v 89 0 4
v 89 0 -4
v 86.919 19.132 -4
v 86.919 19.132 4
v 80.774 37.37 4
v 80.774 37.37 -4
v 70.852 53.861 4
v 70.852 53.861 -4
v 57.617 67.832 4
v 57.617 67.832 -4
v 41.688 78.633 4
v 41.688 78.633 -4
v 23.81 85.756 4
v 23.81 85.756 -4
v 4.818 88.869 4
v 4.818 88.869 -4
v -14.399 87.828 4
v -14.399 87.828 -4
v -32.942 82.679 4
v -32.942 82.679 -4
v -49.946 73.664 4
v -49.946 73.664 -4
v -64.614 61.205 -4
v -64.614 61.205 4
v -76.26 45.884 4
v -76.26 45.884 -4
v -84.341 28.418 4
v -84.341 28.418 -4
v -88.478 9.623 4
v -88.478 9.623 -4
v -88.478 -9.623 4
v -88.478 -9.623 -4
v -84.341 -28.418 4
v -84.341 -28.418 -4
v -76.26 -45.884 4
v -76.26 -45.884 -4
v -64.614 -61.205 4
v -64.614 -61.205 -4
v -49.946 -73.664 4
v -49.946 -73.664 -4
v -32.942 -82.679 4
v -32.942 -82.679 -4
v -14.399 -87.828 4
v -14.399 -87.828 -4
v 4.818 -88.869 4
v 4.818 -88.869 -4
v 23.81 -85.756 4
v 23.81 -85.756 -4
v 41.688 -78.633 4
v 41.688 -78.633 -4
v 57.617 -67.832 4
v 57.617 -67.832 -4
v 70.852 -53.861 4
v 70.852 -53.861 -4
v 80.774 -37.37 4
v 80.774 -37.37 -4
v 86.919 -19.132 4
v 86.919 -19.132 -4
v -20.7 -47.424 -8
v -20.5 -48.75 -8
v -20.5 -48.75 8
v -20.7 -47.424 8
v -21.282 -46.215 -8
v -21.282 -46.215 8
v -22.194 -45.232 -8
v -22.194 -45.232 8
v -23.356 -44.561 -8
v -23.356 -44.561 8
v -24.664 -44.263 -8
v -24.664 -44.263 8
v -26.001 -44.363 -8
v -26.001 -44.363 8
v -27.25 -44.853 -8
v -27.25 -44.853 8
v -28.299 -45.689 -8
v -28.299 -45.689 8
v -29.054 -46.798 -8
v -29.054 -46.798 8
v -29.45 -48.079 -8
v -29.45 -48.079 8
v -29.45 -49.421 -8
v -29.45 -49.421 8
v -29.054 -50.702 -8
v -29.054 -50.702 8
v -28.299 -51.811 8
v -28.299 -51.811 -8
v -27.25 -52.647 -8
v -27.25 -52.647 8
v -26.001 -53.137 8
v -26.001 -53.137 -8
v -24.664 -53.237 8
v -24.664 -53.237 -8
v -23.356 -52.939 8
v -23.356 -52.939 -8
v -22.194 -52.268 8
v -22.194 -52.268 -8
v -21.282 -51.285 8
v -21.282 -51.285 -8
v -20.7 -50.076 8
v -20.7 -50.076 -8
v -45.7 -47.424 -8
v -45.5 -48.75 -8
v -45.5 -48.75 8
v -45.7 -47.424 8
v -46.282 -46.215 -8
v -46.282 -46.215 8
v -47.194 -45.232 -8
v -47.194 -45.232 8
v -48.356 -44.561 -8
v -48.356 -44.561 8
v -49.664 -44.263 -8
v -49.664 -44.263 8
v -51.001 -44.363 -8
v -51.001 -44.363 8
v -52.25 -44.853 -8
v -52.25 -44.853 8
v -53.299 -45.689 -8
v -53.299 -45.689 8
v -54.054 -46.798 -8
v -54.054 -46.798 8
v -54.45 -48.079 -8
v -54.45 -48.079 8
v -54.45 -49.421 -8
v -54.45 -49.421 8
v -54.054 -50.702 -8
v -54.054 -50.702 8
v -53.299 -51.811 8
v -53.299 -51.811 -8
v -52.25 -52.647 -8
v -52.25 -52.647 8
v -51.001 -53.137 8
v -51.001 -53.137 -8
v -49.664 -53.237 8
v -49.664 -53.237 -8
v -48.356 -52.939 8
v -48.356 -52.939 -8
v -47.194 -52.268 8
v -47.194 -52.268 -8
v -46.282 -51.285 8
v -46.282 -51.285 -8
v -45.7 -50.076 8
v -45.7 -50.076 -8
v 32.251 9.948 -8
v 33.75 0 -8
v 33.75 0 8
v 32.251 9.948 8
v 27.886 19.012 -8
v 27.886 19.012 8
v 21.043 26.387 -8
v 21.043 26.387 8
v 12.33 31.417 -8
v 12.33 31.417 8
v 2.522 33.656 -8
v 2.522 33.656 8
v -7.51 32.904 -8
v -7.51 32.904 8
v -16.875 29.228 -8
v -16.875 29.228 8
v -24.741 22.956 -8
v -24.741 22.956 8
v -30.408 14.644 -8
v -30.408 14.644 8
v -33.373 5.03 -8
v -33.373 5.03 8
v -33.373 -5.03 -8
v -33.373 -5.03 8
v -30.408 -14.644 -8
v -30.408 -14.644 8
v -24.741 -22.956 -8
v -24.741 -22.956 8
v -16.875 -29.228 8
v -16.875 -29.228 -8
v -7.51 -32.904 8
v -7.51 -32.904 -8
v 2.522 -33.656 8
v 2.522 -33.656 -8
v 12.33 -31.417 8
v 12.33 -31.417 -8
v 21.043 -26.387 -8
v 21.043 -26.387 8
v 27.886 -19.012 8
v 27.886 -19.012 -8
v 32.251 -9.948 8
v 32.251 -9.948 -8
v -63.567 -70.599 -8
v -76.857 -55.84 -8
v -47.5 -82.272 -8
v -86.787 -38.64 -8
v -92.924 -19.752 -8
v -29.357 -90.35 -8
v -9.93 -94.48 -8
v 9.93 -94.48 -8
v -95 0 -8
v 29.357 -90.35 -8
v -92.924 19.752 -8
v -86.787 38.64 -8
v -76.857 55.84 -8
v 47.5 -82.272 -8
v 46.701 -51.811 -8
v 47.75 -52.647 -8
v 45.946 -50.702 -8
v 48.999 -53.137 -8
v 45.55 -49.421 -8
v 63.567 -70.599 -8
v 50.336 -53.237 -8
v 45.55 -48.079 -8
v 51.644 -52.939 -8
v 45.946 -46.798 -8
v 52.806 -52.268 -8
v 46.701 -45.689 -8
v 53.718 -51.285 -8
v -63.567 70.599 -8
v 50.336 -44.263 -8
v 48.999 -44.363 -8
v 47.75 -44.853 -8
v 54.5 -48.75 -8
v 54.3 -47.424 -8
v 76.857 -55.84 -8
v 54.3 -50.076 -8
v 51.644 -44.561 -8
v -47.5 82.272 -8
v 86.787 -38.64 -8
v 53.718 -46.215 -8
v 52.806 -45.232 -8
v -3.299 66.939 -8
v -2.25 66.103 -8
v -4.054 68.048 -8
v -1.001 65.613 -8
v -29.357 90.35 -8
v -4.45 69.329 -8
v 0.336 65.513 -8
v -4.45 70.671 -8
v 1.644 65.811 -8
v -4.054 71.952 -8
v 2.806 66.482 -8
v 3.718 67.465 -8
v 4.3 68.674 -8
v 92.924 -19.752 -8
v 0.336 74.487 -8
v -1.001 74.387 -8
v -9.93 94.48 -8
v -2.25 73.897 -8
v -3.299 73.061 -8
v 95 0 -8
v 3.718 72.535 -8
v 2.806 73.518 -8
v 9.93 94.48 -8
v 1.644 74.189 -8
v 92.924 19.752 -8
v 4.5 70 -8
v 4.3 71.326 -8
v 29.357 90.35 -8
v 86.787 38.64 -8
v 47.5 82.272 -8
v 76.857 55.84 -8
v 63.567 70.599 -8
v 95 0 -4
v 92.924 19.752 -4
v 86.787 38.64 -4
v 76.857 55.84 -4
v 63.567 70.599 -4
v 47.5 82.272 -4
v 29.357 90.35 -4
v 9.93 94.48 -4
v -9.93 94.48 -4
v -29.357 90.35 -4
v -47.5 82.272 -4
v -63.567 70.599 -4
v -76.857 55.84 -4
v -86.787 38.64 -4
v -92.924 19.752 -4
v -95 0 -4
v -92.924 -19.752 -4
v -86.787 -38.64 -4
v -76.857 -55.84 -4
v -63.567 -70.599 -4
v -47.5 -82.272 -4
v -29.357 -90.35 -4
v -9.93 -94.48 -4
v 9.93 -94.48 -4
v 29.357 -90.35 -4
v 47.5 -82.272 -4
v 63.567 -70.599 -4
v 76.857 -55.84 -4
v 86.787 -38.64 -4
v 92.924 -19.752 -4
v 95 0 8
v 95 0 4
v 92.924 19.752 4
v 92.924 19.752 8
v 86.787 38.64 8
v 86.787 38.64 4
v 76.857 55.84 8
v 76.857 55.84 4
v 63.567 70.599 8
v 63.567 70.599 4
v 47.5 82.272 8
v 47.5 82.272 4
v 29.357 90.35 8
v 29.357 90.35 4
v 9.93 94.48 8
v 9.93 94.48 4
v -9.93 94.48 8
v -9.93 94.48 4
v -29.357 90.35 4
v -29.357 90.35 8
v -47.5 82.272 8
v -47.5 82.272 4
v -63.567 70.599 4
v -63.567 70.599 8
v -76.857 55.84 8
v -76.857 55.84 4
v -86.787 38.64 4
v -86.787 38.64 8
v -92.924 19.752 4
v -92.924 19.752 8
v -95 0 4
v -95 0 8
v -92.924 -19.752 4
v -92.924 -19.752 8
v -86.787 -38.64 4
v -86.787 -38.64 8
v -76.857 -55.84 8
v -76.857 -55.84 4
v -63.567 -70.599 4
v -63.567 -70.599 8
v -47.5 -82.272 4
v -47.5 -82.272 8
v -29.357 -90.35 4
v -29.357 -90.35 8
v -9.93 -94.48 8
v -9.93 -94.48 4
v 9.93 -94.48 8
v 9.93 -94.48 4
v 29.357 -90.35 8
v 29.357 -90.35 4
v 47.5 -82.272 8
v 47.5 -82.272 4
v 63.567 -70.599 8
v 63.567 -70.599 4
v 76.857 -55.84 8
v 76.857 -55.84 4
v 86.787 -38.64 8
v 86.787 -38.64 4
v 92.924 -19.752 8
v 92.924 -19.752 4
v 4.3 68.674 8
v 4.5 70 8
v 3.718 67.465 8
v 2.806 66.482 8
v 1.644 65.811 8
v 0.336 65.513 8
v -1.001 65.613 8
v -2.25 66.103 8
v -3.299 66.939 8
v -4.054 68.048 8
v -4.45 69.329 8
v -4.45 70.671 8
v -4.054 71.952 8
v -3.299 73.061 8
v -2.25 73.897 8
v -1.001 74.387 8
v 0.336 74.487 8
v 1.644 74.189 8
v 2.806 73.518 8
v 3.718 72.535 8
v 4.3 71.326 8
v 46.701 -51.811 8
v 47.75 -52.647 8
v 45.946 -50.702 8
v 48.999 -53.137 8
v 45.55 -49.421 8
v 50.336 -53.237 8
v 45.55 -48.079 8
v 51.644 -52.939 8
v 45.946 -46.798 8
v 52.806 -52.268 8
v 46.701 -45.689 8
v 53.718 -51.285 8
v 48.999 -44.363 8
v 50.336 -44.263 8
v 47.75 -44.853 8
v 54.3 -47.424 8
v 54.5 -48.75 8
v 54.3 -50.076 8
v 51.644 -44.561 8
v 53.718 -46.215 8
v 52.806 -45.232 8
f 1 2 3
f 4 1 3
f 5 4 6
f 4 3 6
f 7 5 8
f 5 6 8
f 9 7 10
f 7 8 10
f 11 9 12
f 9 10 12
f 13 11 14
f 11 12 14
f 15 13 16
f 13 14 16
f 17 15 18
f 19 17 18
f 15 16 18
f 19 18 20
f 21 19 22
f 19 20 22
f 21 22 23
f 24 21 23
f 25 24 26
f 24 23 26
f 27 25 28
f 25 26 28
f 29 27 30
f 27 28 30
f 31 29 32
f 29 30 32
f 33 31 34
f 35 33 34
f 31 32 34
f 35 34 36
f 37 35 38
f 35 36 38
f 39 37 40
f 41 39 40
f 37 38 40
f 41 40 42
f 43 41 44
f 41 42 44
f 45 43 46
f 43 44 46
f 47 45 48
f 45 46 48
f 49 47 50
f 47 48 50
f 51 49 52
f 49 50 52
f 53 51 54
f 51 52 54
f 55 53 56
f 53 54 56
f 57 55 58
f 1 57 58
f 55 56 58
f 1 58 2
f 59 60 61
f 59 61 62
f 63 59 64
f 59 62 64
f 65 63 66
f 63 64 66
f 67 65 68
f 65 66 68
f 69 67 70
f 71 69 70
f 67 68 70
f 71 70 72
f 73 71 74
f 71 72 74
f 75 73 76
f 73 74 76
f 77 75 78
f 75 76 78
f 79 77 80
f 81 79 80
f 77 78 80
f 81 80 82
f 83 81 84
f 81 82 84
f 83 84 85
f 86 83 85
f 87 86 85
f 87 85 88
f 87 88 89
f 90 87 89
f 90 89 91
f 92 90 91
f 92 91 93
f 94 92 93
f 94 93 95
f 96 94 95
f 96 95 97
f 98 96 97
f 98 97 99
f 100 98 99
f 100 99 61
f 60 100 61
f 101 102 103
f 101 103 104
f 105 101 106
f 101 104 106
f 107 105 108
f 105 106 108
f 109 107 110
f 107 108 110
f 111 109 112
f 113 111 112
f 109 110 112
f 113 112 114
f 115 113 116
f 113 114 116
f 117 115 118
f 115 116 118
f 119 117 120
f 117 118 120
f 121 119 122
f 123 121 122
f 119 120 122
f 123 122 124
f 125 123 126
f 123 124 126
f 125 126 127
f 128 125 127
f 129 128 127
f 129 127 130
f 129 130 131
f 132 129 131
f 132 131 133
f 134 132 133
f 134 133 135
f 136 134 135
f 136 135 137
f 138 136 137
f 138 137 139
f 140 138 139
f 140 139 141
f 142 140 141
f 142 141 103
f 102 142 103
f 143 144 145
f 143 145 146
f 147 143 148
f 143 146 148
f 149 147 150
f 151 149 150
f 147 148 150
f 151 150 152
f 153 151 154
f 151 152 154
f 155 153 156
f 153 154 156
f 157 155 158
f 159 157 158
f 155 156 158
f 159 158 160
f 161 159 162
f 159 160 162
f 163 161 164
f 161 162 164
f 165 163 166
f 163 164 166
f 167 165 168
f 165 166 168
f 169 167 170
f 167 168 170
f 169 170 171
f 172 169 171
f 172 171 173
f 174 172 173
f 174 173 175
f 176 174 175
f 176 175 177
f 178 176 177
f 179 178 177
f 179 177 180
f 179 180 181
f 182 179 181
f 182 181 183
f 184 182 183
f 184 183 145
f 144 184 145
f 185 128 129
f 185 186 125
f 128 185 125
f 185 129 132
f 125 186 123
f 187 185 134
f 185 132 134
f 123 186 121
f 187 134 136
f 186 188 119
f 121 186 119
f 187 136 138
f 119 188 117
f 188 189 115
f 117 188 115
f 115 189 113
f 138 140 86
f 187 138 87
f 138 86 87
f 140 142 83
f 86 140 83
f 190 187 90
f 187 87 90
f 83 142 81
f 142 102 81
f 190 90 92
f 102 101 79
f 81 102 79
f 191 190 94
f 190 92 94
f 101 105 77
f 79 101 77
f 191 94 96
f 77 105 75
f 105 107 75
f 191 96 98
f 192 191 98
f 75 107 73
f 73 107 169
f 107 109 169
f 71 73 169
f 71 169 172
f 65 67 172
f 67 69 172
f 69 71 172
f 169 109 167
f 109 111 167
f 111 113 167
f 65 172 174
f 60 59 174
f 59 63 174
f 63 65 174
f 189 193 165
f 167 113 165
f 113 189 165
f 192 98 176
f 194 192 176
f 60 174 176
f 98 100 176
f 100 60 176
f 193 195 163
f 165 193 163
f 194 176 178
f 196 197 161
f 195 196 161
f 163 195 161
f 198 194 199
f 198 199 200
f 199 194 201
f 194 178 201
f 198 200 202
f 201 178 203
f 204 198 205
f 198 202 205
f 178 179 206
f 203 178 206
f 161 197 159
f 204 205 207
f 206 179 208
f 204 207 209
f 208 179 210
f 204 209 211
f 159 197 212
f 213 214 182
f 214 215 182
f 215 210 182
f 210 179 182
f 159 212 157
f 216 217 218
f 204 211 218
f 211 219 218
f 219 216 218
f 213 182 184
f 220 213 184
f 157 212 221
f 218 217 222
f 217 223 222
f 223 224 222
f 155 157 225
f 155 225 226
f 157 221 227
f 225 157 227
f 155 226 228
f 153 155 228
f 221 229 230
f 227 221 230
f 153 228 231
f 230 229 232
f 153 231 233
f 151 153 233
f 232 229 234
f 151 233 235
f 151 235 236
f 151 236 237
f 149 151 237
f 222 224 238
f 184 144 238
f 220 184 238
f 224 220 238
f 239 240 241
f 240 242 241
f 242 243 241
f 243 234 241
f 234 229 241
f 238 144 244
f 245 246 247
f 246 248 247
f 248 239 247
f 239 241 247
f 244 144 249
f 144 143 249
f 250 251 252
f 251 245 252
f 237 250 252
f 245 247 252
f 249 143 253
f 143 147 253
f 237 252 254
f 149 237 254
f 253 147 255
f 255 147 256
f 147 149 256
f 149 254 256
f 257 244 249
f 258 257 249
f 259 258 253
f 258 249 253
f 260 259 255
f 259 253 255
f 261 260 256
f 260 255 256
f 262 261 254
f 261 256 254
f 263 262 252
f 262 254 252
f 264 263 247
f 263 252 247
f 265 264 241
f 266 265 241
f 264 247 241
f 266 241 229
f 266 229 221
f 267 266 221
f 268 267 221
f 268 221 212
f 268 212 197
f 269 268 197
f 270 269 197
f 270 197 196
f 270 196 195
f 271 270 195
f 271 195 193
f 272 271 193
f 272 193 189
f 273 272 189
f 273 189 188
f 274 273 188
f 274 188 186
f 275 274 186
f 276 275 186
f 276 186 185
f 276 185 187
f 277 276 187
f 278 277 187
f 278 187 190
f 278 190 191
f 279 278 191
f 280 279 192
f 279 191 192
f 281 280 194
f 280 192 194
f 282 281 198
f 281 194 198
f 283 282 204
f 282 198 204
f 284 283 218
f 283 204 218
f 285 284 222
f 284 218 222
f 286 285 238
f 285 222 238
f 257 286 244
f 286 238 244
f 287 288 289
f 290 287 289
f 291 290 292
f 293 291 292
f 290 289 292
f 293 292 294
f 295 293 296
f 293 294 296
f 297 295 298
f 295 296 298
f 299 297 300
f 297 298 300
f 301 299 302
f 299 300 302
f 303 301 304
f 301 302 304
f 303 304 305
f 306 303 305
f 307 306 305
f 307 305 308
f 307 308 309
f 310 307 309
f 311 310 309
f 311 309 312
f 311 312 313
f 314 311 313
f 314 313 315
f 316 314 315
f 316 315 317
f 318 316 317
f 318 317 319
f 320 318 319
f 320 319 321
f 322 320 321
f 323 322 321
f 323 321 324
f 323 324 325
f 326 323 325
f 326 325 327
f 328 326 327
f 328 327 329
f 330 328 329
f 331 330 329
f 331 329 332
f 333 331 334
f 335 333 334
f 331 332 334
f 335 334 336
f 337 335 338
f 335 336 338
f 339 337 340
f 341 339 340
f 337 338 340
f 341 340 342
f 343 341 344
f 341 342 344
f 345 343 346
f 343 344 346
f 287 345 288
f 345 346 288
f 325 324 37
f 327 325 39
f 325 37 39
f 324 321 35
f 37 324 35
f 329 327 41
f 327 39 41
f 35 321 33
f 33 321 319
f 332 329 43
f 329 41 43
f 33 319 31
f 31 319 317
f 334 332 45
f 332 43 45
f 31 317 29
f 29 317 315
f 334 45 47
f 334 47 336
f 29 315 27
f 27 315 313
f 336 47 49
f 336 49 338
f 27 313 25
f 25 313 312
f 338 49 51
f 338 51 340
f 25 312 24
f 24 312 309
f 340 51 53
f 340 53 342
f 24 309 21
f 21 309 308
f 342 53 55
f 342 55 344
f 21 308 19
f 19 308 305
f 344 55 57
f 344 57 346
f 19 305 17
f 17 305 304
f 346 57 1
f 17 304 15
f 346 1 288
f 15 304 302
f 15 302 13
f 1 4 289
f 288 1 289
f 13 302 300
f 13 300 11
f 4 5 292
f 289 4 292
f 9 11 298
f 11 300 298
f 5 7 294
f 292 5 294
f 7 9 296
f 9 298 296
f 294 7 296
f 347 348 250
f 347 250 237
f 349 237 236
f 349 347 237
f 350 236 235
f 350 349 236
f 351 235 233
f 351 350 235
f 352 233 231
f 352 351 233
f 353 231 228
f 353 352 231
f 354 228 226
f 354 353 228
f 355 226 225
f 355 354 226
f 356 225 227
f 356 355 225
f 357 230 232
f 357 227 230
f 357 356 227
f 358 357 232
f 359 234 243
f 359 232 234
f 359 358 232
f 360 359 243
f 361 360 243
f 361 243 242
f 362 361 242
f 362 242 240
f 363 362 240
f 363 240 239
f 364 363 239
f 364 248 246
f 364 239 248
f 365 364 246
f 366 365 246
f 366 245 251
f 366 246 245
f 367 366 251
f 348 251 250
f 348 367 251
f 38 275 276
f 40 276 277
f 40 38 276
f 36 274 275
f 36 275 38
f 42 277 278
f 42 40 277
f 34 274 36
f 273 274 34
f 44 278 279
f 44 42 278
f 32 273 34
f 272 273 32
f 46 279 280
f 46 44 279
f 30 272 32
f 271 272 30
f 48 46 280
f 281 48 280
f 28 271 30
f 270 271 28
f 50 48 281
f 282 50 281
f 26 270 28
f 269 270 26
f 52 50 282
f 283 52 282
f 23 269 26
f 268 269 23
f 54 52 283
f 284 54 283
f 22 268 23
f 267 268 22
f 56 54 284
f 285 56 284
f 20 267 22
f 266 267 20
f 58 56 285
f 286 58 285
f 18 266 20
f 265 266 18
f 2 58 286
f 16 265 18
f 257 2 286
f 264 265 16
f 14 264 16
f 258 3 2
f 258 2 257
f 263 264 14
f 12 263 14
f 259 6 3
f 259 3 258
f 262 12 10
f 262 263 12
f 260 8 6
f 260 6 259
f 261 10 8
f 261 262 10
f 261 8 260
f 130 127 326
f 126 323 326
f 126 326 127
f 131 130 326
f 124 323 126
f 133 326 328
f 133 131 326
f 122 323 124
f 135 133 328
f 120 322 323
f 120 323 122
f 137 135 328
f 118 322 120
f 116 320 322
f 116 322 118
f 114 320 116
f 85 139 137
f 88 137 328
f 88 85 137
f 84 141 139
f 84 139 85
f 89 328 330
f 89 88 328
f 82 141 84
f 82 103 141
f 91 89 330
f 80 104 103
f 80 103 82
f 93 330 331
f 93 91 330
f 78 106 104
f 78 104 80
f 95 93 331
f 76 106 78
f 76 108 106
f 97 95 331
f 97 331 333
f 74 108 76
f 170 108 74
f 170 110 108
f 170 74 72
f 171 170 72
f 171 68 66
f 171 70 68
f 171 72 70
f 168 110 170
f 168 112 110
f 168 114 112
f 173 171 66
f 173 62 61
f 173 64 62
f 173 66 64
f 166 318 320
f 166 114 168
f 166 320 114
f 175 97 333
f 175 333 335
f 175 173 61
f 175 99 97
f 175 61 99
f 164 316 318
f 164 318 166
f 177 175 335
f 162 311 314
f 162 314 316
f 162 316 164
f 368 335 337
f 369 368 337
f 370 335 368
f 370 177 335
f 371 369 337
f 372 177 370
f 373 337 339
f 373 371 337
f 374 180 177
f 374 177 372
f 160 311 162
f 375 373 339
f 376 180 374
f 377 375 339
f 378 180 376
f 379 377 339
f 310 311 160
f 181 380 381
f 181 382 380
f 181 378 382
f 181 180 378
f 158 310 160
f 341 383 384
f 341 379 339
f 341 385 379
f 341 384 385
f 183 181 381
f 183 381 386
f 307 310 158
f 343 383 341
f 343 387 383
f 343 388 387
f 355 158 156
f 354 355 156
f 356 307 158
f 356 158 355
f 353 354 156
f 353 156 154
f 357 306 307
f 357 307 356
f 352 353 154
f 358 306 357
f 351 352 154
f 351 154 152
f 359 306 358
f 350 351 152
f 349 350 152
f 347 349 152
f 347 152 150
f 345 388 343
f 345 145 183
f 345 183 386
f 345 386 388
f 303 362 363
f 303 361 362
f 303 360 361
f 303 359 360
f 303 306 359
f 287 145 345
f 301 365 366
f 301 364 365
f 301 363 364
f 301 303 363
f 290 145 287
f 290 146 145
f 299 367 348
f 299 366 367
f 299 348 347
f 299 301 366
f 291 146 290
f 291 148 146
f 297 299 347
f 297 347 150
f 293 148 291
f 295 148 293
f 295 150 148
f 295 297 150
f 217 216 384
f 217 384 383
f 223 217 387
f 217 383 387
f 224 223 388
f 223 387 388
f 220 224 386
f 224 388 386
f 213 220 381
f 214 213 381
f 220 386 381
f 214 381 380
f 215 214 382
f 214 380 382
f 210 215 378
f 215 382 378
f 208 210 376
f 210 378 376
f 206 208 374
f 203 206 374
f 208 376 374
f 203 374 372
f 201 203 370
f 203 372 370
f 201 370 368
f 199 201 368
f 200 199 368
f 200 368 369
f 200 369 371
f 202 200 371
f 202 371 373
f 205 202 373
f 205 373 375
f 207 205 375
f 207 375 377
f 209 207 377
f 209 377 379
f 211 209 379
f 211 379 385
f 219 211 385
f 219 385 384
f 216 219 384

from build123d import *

# Parameters (mm, degrees)
BOSS_EXTRUDE1_DEPTH      = 8
BOSS_EXTRUDE1_DEPTH_BACK = 8
SKETCH2_R                = 95
CUT_EXTRUDE1_DEPTH       = 4
CUT_EXTRUDE1_DEPTH_BACK  = 4
SKETCH2_5_R              = 95
SKETCH2_5_R_2            = 89
SKETCH7_R                = 4.5
CUT_EXTRUDE2_DEPTH       = 167
SKETCH3_R                = 33.75
CUT_EXTRUDE3_DEPTH       = 43
CUT_EXTRUDE4_DEPTH       = 112
CUT_EXTRUDE4_DEPTH_BACK  = 60
SKETCH10_R               = 4.5


with BuildPart() as part:
    # Sketch2 → Boss-Extrude1 (new, two sides: drawn at the far end of the back side and taken through both)
    with BuildSketch(Plane.XY.offset(-BOSS_EXTRUDE1_DEPTH_BACK)):
        Circle(SKETCH2_R)
    extrude(amount=BOSS_EXTRUDE1_DEPTH + BOSS_EXTRUDE1_DEPTH_BACK)

    # Sketch2<5> → Cut-Extrude1 (cut, two sides: drawn at the far end of the back side and taken through both)
    with BuildSketch(Plane.XY.offset(-CUT_EXTRUDE1_DEPTH_BACK)):
        Circle(SKETCH2_5_R)
        Circle(SKETCH2_5_R_2, mode=Mode.SUBTRACT)
    extrude(amount=CUT_EXTRUDE1_DEPTH + CUT_EXTRUDE1_DEPTH_BACK, mode=Mode.SUBTRACT)

    # Sketch7 → Cut-Extrude2 (cut)
    with BuildSketch(Plane.XY.offset(8)):
        with Locations((-50, -48.75)):
            Circle(SKETCH7_R)
        with Locations((50, -48.75)):
            Circle(SKETCH7_R)
        with Locations((-25, -48.75)):
            Circle(SKETCH7_R)
    extrude(amount=-CUT_EXTRUDE2_DEPTH, mode=Mode.SUBTRACT)

    # Sketch3 → Cut-Extrude3 (cut)
    with BuildSketch(Plane.XY.offset(8)):
        Circle(SKETCH3_R)
    extrude(amount=-CUT_EXTRUDE3_DEPTH, mode=Mode.SUBTRACT)

    # Sketch10 → Cut-Extrude4 (cut, two sides: drawn at the far end of the back side and taken through both)
    with BuildSketch(Plane(origin=(0, 0, -8), x_dir=(-1, 0, 0), z_dir=(0, 0, -1)).offset(-CUT_EXTRUDE4_DEPTH_BACK)):
        with Locations((0, 70)):
            Circle(SKETCH10_R)
    extrude(amount=CUT_EXTRUDE4_DEPTH + CUT_EXTRUDE4_DEPTH_BACK, mode=Mode.SUBTRACT)


solid = part.part
